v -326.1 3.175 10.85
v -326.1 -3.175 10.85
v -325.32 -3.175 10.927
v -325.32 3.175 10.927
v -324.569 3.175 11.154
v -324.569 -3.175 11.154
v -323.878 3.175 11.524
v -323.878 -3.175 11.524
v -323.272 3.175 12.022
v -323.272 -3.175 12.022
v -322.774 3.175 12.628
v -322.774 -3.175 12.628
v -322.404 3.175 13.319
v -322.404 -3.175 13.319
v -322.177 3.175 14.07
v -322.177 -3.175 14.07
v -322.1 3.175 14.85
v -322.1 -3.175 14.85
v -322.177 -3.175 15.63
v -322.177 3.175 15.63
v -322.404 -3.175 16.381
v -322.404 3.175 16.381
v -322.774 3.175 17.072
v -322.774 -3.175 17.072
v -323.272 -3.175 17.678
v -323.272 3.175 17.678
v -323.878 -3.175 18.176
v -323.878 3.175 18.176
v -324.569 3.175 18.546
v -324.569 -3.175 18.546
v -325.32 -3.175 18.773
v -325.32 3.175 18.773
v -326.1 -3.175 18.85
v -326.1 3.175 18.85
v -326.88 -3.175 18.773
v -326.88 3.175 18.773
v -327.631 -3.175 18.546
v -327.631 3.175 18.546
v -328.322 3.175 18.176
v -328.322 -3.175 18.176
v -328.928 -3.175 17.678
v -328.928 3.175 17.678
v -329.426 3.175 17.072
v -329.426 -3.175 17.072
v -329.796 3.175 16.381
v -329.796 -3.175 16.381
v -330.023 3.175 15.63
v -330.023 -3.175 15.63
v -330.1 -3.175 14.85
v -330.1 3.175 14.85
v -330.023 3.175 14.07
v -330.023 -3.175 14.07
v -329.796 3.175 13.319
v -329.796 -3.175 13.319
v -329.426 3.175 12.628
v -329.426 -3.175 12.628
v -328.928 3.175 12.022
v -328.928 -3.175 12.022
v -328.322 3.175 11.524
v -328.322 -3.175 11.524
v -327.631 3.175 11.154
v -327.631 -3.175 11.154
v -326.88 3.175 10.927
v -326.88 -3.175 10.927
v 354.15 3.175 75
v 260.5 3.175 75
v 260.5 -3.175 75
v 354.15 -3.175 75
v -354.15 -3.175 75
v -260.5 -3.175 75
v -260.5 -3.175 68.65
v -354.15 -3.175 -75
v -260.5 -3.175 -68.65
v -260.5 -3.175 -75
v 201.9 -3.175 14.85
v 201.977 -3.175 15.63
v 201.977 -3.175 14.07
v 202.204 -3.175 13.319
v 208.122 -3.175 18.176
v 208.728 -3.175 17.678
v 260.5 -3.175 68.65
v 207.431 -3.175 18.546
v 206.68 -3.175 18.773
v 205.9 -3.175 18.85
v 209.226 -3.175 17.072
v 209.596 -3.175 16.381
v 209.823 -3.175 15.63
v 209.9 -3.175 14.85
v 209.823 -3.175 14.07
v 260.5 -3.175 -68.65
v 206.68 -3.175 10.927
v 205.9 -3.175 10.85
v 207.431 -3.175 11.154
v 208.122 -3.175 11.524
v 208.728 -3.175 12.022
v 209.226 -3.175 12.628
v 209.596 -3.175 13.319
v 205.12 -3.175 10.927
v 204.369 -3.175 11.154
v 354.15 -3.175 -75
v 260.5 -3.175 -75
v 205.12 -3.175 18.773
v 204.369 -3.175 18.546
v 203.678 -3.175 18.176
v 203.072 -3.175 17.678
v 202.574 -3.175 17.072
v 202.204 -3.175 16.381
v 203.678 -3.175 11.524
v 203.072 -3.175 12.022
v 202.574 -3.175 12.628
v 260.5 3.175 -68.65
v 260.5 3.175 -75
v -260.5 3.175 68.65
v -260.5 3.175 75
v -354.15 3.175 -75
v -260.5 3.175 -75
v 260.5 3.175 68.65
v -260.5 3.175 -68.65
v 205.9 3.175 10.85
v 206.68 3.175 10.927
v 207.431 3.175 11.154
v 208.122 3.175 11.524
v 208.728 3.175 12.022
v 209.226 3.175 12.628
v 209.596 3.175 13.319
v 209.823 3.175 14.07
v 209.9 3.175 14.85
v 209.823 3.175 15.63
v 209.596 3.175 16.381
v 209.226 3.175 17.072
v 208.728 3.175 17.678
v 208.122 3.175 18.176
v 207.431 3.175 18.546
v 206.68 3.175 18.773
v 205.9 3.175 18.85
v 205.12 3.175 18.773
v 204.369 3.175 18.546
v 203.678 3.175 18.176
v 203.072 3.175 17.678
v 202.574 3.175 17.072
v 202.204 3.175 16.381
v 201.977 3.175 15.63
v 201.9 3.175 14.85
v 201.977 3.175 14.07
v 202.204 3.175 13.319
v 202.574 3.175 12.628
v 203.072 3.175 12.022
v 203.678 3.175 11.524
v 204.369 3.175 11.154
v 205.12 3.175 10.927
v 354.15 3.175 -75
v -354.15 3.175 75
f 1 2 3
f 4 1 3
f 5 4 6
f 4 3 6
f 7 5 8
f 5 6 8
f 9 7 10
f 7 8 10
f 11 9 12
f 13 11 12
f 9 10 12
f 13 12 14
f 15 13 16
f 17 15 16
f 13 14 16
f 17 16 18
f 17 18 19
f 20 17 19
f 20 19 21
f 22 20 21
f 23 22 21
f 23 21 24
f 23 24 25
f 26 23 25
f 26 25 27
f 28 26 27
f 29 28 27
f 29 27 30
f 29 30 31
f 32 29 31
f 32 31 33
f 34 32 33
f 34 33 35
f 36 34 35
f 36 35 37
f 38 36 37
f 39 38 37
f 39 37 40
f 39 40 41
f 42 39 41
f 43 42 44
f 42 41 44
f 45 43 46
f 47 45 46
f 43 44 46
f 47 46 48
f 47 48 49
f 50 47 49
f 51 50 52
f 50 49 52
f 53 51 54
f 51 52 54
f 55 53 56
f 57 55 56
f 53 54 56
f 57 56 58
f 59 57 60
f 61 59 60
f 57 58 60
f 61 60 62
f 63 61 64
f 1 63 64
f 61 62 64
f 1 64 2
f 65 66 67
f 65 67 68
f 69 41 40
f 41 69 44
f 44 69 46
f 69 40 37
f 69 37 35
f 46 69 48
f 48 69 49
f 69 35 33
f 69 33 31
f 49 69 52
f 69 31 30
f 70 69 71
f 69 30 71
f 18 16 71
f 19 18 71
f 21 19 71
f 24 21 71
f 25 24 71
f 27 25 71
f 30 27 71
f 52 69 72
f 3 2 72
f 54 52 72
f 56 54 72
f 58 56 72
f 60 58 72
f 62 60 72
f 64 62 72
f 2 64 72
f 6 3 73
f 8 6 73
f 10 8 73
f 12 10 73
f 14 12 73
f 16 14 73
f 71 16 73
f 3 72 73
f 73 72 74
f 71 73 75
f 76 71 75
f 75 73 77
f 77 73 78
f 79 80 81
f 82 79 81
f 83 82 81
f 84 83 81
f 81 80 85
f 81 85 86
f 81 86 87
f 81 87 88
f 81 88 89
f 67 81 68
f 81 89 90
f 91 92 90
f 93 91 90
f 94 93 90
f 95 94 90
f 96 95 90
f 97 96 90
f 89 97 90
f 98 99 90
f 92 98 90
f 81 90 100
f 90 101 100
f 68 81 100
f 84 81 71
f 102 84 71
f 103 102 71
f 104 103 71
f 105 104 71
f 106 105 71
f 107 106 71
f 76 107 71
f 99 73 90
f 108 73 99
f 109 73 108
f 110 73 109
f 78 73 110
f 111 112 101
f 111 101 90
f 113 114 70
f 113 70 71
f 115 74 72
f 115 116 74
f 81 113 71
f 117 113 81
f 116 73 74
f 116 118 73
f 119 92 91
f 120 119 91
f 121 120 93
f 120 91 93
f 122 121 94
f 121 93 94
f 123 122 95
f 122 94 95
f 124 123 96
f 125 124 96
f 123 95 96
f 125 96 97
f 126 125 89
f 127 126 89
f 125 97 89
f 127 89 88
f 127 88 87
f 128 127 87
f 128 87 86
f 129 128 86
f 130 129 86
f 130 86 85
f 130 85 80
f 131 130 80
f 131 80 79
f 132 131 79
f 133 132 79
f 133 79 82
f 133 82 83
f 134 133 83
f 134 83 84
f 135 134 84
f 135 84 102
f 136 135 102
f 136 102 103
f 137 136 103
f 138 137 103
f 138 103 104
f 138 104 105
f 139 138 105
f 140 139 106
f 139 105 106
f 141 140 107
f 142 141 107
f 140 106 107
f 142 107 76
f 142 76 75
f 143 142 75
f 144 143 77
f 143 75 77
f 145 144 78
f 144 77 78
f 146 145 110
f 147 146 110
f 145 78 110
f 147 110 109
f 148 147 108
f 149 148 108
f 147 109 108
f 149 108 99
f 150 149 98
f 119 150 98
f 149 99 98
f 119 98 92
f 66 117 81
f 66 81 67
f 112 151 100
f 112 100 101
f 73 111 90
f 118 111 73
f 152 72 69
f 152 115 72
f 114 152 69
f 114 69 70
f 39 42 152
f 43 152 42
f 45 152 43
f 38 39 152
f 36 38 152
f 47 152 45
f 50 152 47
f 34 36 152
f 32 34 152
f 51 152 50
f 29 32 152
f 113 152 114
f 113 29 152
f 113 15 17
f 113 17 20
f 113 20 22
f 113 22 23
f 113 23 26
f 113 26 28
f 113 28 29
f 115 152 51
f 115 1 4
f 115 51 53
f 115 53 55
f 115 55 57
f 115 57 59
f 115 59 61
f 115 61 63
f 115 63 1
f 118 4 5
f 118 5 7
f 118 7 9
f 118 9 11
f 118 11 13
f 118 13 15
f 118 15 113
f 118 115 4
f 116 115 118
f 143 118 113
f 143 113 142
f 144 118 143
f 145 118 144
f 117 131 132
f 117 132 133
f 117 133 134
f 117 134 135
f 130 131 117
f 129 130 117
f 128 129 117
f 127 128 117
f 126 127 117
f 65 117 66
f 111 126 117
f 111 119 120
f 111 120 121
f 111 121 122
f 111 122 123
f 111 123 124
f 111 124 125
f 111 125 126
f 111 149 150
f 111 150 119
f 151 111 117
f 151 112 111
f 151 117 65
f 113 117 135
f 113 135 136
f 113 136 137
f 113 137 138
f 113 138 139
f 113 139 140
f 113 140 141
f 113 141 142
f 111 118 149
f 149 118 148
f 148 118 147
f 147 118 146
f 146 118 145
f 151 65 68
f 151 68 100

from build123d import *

# Parameters (mm, degrees)
BOSS_EXTRUDE1_DEPTH  = 3.175
SKETCH4_R            = 4
LEFT_AND_RIGHT_DEPTH = 363.060140032


with BuildPart() as part:
    # Sketch1 → Boss-Extrude1 (new, symmetric)
    with BuildSketch(Plane(origin=(0, 0, 0), x_dir=(1, 0, 0), z_dir=(0, 1, 0))):
        Polygon((-354.15, 75), (-354.15, -75), (-260.5, -75), (-260.5, -68.65), (260.5, -68.65), (260.5, -75), (354.15, -75), (354.15, 75), (260.5, 75), (260.5, 68.65), (-260.5, 68.65), (-260.5, 75), align=None)
    extrude(amount=BOSS_EXTRUDE1_DEPTH, both=True)

    # Sketch4 → Left and Right (cut, through all)
    with BuildSketch(Plane.XZ.offset(3.175)):
        with Locations(Location((-326.1, 14.85, 0), (0, 0, 270))):
            Circle(SKETCH4_R)
        with Locations(Location((205.9, 14.85, 0), (0, 0, 270))):
            Circle(SKETCH4_R)
    extrude(amount=-LEFT_AND_RIGHT_DEPTH, mode=Mode.SUBTRACT)


solid = part.part
